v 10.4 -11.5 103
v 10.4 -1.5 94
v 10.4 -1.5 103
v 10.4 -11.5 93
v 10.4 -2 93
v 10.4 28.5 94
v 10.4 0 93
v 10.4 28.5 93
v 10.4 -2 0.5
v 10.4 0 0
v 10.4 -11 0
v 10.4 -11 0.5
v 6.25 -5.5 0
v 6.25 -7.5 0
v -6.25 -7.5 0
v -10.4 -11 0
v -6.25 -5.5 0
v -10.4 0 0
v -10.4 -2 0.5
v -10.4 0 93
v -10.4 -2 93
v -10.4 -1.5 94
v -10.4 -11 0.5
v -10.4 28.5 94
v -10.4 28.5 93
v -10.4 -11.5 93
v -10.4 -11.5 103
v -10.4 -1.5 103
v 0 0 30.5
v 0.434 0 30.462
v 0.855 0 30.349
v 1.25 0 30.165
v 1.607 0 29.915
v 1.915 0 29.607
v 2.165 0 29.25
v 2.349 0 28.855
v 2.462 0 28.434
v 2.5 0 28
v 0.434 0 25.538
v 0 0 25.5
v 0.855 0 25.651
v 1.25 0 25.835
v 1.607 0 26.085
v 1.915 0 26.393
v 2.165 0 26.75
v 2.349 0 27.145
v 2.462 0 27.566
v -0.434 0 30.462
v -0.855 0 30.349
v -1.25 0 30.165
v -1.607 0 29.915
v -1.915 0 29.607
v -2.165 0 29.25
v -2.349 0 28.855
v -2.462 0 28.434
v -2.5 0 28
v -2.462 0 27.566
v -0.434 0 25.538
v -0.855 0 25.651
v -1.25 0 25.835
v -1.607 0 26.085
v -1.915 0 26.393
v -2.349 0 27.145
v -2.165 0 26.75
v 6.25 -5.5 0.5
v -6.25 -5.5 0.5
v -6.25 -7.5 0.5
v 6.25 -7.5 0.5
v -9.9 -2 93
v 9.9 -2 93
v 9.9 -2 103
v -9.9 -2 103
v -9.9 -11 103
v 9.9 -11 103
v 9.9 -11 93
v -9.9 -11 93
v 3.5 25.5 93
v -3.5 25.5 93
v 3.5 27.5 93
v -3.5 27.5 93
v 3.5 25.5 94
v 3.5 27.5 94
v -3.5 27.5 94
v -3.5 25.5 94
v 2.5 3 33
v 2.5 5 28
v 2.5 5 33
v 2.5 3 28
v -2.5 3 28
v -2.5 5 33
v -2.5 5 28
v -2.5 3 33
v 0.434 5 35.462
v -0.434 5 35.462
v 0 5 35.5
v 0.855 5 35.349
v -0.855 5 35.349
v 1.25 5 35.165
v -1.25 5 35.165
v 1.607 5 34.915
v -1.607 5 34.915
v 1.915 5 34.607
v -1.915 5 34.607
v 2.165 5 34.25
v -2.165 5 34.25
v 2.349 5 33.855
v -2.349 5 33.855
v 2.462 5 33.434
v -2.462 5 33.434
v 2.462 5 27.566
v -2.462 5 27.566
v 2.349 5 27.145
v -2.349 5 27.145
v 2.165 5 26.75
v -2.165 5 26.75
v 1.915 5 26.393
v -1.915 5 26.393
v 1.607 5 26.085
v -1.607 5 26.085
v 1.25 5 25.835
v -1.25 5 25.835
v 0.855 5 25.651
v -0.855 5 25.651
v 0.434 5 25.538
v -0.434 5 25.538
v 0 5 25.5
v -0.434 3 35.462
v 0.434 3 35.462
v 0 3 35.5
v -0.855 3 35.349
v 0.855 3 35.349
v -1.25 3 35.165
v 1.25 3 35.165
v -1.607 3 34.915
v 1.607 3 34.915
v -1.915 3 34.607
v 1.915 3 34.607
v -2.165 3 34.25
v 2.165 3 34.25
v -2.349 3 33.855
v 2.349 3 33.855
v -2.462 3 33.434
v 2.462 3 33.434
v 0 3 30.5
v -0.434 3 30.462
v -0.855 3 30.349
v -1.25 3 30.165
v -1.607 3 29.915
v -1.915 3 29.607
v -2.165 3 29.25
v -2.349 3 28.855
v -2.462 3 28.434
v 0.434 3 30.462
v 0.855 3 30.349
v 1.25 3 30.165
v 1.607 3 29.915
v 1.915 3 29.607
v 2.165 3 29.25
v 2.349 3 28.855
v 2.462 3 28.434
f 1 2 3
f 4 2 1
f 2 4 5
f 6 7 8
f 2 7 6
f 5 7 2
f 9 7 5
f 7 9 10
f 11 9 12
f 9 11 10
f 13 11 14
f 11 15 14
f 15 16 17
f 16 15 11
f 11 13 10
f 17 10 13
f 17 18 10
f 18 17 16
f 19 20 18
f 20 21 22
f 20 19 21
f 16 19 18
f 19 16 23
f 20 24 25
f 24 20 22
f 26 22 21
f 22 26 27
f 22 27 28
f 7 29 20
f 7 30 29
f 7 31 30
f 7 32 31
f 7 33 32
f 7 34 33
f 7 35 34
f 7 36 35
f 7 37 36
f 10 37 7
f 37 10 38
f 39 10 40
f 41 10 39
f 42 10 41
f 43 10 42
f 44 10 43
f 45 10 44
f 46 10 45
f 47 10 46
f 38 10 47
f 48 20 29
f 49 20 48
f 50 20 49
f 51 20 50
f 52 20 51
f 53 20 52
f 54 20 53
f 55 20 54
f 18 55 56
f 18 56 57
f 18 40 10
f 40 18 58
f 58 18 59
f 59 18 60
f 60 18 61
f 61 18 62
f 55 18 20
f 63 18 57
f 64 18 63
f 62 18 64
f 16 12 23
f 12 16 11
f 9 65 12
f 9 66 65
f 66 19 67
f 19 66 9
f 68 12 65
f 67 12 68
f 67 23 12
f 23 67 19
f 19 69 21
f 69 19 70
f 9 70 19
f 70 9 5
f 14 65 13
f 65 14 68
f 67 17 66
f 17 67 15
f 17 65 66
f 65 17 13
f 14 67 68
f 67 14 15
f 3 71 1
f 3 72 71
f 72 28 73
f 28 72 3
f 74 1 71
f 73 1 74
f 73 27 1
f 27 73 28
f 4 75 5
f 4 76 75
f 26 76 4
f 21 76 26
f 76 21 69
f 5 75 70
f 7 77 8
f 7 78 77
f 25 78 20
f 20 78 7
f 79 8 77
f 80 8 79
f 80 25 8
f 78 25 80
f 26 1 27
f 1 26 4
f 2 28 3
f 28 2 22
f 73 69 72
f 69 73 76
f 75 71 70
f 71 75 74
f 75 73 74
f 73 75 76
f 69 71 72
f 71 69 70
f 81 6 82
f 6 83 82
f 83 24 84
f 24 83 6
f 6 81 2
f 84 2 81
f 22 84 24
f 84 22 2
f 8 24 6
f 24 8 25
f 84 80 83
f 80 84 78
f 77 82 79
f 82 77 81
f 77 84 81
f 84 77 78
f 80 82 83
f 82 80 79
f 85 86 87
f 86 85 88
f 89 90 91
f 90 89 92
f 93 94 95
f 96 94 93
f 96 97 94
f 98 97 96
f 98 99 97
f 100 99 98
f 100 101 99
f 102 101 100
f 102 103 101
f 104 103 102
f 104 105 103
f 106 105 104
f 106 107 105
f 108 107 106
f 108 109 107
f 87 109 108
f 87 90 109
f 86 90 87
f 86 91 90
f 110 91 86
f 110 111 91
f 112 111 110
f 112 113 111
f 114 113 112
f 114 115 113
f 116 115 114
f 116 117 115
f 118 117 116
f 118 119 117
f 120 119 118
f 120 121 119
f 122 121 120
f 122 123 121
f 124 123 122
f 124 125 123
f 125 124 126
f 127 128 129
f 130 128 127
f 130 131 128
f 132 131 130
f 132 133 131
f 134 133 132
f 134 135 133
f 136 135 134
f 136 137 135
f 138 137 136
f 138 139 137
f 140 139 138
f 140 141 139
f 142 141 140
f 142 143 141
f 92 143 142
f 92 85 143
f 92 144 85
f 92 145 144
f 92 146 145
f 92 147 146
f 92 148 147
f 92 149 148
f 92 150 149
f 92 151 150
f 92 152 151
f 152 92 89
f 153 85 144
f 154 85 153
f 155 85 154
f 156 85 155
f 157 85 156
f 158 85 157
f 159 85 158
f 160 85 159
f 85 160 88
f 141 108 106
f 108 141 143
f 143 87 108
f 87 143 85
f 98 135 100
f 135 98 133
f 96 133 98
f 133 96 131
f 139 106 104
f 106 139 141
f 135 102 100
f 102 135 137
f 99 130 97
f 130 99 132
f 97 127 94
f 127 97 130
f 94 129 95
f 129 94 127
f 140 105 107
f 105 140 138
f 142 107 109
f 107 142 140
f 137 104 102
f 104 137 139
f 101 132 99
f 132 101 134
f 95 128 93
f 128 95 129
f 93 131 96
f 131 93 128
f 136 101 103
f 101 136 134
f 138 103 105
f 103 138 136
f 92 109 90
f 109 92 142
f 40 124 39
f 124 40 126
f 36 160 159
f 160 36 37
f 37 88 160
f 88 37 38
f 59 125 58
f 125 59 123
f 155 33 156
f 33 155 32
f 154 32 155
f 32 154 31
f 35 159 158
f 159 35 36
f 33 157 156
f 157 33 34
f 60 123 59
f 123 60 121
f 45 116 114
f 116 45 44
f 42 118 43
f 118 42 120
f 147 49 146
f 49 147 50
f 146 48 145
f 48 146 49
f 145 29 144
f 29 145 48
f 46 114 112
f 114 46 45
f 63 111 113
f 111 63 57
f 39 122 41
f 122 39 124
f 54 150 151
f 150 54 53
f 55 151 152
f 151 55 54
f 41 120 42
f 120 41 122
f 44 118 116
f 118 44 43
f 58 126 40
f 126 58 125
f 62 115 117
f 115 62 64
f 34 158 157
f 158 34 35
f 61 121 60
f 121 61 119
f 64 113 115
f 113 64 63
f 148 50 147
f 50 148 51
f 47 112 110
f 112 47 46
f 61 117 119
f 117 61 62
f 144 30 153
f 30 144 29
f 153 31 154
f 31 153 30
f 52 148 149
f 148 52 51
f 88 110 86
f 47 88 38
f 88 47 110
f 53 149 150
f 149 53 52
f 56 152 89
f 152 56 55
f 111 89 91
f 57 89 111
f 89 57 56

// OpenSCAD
translate([0,4,30.5])
cube([5,2,5],center=true);

translate([0,5,33])
rotate([90,0,0])
cylinder(d=5,h=2, $fn=36);

translate([0,5,28])
rotate([90,0,0])
cylinder(d=5,h=5, $fn=36);
translate([0,-1,93/2])
cube([20.8,2,93],center=true);
translate([0,-11/2,9/2])
kabelhalter1();

//translate([0,0,9/2])
//kabelhalter();

translate([0,-1.5,93])
rotate([0,0,180])
union() {
translate([0,5,10/2])
O();
difference() {
translate([0,-15,1/2])
cube([20.8,30,1], center = true);
translate([0,-28,0])
cube([7,2,20], center = true); 
}
}



module kabelhalter1(){
difference(){
L();
    translate([0,-1,-4]){
cube([12.5,2,3], center = true);
}

    
}}



module kabelhalter(){
difference(){
L();
    translate([0,4.75,0]){
 hohles();
    }
    translate([7,4.75,0]){
 hohles();
    }
    translate([-7,4.75,0]){
 hohles();
    }
    translate([0,-1,-4]){
cube([12.5,2,3], center = true);
}

    
}}







module L(){

difference()
{
   cube([20.8,11,9], center = true); 
    //inner cube
    translate([0,-2,1]){
cube([21.8,11,10], center = true);
    }
}
}






module spange(){
difference(){
O();
    translate([0,4.75,0]){
 hohles();
    }
    translate([7,4.75,0]){
 hohles();
    }
    translate([-7,4.75,0]){
 hohles();
    }
    
}}
module O(){

difference()
{
   cube([20.8,10,10], center = true); 
    //inner cube
    translate([0,0,0]){
cube([19.8,9,10], center = true);
    }
}
}

module hohles()
{
    
rotate([90,90,0]){

translate([-1.5,0,0])
{
    union(){
cylinder(3,d=2,center=true,$fn=40);
translate([3,0,0])
{
cylinder(3,d=2,center=true,$fn=40);
}}}}

    }
